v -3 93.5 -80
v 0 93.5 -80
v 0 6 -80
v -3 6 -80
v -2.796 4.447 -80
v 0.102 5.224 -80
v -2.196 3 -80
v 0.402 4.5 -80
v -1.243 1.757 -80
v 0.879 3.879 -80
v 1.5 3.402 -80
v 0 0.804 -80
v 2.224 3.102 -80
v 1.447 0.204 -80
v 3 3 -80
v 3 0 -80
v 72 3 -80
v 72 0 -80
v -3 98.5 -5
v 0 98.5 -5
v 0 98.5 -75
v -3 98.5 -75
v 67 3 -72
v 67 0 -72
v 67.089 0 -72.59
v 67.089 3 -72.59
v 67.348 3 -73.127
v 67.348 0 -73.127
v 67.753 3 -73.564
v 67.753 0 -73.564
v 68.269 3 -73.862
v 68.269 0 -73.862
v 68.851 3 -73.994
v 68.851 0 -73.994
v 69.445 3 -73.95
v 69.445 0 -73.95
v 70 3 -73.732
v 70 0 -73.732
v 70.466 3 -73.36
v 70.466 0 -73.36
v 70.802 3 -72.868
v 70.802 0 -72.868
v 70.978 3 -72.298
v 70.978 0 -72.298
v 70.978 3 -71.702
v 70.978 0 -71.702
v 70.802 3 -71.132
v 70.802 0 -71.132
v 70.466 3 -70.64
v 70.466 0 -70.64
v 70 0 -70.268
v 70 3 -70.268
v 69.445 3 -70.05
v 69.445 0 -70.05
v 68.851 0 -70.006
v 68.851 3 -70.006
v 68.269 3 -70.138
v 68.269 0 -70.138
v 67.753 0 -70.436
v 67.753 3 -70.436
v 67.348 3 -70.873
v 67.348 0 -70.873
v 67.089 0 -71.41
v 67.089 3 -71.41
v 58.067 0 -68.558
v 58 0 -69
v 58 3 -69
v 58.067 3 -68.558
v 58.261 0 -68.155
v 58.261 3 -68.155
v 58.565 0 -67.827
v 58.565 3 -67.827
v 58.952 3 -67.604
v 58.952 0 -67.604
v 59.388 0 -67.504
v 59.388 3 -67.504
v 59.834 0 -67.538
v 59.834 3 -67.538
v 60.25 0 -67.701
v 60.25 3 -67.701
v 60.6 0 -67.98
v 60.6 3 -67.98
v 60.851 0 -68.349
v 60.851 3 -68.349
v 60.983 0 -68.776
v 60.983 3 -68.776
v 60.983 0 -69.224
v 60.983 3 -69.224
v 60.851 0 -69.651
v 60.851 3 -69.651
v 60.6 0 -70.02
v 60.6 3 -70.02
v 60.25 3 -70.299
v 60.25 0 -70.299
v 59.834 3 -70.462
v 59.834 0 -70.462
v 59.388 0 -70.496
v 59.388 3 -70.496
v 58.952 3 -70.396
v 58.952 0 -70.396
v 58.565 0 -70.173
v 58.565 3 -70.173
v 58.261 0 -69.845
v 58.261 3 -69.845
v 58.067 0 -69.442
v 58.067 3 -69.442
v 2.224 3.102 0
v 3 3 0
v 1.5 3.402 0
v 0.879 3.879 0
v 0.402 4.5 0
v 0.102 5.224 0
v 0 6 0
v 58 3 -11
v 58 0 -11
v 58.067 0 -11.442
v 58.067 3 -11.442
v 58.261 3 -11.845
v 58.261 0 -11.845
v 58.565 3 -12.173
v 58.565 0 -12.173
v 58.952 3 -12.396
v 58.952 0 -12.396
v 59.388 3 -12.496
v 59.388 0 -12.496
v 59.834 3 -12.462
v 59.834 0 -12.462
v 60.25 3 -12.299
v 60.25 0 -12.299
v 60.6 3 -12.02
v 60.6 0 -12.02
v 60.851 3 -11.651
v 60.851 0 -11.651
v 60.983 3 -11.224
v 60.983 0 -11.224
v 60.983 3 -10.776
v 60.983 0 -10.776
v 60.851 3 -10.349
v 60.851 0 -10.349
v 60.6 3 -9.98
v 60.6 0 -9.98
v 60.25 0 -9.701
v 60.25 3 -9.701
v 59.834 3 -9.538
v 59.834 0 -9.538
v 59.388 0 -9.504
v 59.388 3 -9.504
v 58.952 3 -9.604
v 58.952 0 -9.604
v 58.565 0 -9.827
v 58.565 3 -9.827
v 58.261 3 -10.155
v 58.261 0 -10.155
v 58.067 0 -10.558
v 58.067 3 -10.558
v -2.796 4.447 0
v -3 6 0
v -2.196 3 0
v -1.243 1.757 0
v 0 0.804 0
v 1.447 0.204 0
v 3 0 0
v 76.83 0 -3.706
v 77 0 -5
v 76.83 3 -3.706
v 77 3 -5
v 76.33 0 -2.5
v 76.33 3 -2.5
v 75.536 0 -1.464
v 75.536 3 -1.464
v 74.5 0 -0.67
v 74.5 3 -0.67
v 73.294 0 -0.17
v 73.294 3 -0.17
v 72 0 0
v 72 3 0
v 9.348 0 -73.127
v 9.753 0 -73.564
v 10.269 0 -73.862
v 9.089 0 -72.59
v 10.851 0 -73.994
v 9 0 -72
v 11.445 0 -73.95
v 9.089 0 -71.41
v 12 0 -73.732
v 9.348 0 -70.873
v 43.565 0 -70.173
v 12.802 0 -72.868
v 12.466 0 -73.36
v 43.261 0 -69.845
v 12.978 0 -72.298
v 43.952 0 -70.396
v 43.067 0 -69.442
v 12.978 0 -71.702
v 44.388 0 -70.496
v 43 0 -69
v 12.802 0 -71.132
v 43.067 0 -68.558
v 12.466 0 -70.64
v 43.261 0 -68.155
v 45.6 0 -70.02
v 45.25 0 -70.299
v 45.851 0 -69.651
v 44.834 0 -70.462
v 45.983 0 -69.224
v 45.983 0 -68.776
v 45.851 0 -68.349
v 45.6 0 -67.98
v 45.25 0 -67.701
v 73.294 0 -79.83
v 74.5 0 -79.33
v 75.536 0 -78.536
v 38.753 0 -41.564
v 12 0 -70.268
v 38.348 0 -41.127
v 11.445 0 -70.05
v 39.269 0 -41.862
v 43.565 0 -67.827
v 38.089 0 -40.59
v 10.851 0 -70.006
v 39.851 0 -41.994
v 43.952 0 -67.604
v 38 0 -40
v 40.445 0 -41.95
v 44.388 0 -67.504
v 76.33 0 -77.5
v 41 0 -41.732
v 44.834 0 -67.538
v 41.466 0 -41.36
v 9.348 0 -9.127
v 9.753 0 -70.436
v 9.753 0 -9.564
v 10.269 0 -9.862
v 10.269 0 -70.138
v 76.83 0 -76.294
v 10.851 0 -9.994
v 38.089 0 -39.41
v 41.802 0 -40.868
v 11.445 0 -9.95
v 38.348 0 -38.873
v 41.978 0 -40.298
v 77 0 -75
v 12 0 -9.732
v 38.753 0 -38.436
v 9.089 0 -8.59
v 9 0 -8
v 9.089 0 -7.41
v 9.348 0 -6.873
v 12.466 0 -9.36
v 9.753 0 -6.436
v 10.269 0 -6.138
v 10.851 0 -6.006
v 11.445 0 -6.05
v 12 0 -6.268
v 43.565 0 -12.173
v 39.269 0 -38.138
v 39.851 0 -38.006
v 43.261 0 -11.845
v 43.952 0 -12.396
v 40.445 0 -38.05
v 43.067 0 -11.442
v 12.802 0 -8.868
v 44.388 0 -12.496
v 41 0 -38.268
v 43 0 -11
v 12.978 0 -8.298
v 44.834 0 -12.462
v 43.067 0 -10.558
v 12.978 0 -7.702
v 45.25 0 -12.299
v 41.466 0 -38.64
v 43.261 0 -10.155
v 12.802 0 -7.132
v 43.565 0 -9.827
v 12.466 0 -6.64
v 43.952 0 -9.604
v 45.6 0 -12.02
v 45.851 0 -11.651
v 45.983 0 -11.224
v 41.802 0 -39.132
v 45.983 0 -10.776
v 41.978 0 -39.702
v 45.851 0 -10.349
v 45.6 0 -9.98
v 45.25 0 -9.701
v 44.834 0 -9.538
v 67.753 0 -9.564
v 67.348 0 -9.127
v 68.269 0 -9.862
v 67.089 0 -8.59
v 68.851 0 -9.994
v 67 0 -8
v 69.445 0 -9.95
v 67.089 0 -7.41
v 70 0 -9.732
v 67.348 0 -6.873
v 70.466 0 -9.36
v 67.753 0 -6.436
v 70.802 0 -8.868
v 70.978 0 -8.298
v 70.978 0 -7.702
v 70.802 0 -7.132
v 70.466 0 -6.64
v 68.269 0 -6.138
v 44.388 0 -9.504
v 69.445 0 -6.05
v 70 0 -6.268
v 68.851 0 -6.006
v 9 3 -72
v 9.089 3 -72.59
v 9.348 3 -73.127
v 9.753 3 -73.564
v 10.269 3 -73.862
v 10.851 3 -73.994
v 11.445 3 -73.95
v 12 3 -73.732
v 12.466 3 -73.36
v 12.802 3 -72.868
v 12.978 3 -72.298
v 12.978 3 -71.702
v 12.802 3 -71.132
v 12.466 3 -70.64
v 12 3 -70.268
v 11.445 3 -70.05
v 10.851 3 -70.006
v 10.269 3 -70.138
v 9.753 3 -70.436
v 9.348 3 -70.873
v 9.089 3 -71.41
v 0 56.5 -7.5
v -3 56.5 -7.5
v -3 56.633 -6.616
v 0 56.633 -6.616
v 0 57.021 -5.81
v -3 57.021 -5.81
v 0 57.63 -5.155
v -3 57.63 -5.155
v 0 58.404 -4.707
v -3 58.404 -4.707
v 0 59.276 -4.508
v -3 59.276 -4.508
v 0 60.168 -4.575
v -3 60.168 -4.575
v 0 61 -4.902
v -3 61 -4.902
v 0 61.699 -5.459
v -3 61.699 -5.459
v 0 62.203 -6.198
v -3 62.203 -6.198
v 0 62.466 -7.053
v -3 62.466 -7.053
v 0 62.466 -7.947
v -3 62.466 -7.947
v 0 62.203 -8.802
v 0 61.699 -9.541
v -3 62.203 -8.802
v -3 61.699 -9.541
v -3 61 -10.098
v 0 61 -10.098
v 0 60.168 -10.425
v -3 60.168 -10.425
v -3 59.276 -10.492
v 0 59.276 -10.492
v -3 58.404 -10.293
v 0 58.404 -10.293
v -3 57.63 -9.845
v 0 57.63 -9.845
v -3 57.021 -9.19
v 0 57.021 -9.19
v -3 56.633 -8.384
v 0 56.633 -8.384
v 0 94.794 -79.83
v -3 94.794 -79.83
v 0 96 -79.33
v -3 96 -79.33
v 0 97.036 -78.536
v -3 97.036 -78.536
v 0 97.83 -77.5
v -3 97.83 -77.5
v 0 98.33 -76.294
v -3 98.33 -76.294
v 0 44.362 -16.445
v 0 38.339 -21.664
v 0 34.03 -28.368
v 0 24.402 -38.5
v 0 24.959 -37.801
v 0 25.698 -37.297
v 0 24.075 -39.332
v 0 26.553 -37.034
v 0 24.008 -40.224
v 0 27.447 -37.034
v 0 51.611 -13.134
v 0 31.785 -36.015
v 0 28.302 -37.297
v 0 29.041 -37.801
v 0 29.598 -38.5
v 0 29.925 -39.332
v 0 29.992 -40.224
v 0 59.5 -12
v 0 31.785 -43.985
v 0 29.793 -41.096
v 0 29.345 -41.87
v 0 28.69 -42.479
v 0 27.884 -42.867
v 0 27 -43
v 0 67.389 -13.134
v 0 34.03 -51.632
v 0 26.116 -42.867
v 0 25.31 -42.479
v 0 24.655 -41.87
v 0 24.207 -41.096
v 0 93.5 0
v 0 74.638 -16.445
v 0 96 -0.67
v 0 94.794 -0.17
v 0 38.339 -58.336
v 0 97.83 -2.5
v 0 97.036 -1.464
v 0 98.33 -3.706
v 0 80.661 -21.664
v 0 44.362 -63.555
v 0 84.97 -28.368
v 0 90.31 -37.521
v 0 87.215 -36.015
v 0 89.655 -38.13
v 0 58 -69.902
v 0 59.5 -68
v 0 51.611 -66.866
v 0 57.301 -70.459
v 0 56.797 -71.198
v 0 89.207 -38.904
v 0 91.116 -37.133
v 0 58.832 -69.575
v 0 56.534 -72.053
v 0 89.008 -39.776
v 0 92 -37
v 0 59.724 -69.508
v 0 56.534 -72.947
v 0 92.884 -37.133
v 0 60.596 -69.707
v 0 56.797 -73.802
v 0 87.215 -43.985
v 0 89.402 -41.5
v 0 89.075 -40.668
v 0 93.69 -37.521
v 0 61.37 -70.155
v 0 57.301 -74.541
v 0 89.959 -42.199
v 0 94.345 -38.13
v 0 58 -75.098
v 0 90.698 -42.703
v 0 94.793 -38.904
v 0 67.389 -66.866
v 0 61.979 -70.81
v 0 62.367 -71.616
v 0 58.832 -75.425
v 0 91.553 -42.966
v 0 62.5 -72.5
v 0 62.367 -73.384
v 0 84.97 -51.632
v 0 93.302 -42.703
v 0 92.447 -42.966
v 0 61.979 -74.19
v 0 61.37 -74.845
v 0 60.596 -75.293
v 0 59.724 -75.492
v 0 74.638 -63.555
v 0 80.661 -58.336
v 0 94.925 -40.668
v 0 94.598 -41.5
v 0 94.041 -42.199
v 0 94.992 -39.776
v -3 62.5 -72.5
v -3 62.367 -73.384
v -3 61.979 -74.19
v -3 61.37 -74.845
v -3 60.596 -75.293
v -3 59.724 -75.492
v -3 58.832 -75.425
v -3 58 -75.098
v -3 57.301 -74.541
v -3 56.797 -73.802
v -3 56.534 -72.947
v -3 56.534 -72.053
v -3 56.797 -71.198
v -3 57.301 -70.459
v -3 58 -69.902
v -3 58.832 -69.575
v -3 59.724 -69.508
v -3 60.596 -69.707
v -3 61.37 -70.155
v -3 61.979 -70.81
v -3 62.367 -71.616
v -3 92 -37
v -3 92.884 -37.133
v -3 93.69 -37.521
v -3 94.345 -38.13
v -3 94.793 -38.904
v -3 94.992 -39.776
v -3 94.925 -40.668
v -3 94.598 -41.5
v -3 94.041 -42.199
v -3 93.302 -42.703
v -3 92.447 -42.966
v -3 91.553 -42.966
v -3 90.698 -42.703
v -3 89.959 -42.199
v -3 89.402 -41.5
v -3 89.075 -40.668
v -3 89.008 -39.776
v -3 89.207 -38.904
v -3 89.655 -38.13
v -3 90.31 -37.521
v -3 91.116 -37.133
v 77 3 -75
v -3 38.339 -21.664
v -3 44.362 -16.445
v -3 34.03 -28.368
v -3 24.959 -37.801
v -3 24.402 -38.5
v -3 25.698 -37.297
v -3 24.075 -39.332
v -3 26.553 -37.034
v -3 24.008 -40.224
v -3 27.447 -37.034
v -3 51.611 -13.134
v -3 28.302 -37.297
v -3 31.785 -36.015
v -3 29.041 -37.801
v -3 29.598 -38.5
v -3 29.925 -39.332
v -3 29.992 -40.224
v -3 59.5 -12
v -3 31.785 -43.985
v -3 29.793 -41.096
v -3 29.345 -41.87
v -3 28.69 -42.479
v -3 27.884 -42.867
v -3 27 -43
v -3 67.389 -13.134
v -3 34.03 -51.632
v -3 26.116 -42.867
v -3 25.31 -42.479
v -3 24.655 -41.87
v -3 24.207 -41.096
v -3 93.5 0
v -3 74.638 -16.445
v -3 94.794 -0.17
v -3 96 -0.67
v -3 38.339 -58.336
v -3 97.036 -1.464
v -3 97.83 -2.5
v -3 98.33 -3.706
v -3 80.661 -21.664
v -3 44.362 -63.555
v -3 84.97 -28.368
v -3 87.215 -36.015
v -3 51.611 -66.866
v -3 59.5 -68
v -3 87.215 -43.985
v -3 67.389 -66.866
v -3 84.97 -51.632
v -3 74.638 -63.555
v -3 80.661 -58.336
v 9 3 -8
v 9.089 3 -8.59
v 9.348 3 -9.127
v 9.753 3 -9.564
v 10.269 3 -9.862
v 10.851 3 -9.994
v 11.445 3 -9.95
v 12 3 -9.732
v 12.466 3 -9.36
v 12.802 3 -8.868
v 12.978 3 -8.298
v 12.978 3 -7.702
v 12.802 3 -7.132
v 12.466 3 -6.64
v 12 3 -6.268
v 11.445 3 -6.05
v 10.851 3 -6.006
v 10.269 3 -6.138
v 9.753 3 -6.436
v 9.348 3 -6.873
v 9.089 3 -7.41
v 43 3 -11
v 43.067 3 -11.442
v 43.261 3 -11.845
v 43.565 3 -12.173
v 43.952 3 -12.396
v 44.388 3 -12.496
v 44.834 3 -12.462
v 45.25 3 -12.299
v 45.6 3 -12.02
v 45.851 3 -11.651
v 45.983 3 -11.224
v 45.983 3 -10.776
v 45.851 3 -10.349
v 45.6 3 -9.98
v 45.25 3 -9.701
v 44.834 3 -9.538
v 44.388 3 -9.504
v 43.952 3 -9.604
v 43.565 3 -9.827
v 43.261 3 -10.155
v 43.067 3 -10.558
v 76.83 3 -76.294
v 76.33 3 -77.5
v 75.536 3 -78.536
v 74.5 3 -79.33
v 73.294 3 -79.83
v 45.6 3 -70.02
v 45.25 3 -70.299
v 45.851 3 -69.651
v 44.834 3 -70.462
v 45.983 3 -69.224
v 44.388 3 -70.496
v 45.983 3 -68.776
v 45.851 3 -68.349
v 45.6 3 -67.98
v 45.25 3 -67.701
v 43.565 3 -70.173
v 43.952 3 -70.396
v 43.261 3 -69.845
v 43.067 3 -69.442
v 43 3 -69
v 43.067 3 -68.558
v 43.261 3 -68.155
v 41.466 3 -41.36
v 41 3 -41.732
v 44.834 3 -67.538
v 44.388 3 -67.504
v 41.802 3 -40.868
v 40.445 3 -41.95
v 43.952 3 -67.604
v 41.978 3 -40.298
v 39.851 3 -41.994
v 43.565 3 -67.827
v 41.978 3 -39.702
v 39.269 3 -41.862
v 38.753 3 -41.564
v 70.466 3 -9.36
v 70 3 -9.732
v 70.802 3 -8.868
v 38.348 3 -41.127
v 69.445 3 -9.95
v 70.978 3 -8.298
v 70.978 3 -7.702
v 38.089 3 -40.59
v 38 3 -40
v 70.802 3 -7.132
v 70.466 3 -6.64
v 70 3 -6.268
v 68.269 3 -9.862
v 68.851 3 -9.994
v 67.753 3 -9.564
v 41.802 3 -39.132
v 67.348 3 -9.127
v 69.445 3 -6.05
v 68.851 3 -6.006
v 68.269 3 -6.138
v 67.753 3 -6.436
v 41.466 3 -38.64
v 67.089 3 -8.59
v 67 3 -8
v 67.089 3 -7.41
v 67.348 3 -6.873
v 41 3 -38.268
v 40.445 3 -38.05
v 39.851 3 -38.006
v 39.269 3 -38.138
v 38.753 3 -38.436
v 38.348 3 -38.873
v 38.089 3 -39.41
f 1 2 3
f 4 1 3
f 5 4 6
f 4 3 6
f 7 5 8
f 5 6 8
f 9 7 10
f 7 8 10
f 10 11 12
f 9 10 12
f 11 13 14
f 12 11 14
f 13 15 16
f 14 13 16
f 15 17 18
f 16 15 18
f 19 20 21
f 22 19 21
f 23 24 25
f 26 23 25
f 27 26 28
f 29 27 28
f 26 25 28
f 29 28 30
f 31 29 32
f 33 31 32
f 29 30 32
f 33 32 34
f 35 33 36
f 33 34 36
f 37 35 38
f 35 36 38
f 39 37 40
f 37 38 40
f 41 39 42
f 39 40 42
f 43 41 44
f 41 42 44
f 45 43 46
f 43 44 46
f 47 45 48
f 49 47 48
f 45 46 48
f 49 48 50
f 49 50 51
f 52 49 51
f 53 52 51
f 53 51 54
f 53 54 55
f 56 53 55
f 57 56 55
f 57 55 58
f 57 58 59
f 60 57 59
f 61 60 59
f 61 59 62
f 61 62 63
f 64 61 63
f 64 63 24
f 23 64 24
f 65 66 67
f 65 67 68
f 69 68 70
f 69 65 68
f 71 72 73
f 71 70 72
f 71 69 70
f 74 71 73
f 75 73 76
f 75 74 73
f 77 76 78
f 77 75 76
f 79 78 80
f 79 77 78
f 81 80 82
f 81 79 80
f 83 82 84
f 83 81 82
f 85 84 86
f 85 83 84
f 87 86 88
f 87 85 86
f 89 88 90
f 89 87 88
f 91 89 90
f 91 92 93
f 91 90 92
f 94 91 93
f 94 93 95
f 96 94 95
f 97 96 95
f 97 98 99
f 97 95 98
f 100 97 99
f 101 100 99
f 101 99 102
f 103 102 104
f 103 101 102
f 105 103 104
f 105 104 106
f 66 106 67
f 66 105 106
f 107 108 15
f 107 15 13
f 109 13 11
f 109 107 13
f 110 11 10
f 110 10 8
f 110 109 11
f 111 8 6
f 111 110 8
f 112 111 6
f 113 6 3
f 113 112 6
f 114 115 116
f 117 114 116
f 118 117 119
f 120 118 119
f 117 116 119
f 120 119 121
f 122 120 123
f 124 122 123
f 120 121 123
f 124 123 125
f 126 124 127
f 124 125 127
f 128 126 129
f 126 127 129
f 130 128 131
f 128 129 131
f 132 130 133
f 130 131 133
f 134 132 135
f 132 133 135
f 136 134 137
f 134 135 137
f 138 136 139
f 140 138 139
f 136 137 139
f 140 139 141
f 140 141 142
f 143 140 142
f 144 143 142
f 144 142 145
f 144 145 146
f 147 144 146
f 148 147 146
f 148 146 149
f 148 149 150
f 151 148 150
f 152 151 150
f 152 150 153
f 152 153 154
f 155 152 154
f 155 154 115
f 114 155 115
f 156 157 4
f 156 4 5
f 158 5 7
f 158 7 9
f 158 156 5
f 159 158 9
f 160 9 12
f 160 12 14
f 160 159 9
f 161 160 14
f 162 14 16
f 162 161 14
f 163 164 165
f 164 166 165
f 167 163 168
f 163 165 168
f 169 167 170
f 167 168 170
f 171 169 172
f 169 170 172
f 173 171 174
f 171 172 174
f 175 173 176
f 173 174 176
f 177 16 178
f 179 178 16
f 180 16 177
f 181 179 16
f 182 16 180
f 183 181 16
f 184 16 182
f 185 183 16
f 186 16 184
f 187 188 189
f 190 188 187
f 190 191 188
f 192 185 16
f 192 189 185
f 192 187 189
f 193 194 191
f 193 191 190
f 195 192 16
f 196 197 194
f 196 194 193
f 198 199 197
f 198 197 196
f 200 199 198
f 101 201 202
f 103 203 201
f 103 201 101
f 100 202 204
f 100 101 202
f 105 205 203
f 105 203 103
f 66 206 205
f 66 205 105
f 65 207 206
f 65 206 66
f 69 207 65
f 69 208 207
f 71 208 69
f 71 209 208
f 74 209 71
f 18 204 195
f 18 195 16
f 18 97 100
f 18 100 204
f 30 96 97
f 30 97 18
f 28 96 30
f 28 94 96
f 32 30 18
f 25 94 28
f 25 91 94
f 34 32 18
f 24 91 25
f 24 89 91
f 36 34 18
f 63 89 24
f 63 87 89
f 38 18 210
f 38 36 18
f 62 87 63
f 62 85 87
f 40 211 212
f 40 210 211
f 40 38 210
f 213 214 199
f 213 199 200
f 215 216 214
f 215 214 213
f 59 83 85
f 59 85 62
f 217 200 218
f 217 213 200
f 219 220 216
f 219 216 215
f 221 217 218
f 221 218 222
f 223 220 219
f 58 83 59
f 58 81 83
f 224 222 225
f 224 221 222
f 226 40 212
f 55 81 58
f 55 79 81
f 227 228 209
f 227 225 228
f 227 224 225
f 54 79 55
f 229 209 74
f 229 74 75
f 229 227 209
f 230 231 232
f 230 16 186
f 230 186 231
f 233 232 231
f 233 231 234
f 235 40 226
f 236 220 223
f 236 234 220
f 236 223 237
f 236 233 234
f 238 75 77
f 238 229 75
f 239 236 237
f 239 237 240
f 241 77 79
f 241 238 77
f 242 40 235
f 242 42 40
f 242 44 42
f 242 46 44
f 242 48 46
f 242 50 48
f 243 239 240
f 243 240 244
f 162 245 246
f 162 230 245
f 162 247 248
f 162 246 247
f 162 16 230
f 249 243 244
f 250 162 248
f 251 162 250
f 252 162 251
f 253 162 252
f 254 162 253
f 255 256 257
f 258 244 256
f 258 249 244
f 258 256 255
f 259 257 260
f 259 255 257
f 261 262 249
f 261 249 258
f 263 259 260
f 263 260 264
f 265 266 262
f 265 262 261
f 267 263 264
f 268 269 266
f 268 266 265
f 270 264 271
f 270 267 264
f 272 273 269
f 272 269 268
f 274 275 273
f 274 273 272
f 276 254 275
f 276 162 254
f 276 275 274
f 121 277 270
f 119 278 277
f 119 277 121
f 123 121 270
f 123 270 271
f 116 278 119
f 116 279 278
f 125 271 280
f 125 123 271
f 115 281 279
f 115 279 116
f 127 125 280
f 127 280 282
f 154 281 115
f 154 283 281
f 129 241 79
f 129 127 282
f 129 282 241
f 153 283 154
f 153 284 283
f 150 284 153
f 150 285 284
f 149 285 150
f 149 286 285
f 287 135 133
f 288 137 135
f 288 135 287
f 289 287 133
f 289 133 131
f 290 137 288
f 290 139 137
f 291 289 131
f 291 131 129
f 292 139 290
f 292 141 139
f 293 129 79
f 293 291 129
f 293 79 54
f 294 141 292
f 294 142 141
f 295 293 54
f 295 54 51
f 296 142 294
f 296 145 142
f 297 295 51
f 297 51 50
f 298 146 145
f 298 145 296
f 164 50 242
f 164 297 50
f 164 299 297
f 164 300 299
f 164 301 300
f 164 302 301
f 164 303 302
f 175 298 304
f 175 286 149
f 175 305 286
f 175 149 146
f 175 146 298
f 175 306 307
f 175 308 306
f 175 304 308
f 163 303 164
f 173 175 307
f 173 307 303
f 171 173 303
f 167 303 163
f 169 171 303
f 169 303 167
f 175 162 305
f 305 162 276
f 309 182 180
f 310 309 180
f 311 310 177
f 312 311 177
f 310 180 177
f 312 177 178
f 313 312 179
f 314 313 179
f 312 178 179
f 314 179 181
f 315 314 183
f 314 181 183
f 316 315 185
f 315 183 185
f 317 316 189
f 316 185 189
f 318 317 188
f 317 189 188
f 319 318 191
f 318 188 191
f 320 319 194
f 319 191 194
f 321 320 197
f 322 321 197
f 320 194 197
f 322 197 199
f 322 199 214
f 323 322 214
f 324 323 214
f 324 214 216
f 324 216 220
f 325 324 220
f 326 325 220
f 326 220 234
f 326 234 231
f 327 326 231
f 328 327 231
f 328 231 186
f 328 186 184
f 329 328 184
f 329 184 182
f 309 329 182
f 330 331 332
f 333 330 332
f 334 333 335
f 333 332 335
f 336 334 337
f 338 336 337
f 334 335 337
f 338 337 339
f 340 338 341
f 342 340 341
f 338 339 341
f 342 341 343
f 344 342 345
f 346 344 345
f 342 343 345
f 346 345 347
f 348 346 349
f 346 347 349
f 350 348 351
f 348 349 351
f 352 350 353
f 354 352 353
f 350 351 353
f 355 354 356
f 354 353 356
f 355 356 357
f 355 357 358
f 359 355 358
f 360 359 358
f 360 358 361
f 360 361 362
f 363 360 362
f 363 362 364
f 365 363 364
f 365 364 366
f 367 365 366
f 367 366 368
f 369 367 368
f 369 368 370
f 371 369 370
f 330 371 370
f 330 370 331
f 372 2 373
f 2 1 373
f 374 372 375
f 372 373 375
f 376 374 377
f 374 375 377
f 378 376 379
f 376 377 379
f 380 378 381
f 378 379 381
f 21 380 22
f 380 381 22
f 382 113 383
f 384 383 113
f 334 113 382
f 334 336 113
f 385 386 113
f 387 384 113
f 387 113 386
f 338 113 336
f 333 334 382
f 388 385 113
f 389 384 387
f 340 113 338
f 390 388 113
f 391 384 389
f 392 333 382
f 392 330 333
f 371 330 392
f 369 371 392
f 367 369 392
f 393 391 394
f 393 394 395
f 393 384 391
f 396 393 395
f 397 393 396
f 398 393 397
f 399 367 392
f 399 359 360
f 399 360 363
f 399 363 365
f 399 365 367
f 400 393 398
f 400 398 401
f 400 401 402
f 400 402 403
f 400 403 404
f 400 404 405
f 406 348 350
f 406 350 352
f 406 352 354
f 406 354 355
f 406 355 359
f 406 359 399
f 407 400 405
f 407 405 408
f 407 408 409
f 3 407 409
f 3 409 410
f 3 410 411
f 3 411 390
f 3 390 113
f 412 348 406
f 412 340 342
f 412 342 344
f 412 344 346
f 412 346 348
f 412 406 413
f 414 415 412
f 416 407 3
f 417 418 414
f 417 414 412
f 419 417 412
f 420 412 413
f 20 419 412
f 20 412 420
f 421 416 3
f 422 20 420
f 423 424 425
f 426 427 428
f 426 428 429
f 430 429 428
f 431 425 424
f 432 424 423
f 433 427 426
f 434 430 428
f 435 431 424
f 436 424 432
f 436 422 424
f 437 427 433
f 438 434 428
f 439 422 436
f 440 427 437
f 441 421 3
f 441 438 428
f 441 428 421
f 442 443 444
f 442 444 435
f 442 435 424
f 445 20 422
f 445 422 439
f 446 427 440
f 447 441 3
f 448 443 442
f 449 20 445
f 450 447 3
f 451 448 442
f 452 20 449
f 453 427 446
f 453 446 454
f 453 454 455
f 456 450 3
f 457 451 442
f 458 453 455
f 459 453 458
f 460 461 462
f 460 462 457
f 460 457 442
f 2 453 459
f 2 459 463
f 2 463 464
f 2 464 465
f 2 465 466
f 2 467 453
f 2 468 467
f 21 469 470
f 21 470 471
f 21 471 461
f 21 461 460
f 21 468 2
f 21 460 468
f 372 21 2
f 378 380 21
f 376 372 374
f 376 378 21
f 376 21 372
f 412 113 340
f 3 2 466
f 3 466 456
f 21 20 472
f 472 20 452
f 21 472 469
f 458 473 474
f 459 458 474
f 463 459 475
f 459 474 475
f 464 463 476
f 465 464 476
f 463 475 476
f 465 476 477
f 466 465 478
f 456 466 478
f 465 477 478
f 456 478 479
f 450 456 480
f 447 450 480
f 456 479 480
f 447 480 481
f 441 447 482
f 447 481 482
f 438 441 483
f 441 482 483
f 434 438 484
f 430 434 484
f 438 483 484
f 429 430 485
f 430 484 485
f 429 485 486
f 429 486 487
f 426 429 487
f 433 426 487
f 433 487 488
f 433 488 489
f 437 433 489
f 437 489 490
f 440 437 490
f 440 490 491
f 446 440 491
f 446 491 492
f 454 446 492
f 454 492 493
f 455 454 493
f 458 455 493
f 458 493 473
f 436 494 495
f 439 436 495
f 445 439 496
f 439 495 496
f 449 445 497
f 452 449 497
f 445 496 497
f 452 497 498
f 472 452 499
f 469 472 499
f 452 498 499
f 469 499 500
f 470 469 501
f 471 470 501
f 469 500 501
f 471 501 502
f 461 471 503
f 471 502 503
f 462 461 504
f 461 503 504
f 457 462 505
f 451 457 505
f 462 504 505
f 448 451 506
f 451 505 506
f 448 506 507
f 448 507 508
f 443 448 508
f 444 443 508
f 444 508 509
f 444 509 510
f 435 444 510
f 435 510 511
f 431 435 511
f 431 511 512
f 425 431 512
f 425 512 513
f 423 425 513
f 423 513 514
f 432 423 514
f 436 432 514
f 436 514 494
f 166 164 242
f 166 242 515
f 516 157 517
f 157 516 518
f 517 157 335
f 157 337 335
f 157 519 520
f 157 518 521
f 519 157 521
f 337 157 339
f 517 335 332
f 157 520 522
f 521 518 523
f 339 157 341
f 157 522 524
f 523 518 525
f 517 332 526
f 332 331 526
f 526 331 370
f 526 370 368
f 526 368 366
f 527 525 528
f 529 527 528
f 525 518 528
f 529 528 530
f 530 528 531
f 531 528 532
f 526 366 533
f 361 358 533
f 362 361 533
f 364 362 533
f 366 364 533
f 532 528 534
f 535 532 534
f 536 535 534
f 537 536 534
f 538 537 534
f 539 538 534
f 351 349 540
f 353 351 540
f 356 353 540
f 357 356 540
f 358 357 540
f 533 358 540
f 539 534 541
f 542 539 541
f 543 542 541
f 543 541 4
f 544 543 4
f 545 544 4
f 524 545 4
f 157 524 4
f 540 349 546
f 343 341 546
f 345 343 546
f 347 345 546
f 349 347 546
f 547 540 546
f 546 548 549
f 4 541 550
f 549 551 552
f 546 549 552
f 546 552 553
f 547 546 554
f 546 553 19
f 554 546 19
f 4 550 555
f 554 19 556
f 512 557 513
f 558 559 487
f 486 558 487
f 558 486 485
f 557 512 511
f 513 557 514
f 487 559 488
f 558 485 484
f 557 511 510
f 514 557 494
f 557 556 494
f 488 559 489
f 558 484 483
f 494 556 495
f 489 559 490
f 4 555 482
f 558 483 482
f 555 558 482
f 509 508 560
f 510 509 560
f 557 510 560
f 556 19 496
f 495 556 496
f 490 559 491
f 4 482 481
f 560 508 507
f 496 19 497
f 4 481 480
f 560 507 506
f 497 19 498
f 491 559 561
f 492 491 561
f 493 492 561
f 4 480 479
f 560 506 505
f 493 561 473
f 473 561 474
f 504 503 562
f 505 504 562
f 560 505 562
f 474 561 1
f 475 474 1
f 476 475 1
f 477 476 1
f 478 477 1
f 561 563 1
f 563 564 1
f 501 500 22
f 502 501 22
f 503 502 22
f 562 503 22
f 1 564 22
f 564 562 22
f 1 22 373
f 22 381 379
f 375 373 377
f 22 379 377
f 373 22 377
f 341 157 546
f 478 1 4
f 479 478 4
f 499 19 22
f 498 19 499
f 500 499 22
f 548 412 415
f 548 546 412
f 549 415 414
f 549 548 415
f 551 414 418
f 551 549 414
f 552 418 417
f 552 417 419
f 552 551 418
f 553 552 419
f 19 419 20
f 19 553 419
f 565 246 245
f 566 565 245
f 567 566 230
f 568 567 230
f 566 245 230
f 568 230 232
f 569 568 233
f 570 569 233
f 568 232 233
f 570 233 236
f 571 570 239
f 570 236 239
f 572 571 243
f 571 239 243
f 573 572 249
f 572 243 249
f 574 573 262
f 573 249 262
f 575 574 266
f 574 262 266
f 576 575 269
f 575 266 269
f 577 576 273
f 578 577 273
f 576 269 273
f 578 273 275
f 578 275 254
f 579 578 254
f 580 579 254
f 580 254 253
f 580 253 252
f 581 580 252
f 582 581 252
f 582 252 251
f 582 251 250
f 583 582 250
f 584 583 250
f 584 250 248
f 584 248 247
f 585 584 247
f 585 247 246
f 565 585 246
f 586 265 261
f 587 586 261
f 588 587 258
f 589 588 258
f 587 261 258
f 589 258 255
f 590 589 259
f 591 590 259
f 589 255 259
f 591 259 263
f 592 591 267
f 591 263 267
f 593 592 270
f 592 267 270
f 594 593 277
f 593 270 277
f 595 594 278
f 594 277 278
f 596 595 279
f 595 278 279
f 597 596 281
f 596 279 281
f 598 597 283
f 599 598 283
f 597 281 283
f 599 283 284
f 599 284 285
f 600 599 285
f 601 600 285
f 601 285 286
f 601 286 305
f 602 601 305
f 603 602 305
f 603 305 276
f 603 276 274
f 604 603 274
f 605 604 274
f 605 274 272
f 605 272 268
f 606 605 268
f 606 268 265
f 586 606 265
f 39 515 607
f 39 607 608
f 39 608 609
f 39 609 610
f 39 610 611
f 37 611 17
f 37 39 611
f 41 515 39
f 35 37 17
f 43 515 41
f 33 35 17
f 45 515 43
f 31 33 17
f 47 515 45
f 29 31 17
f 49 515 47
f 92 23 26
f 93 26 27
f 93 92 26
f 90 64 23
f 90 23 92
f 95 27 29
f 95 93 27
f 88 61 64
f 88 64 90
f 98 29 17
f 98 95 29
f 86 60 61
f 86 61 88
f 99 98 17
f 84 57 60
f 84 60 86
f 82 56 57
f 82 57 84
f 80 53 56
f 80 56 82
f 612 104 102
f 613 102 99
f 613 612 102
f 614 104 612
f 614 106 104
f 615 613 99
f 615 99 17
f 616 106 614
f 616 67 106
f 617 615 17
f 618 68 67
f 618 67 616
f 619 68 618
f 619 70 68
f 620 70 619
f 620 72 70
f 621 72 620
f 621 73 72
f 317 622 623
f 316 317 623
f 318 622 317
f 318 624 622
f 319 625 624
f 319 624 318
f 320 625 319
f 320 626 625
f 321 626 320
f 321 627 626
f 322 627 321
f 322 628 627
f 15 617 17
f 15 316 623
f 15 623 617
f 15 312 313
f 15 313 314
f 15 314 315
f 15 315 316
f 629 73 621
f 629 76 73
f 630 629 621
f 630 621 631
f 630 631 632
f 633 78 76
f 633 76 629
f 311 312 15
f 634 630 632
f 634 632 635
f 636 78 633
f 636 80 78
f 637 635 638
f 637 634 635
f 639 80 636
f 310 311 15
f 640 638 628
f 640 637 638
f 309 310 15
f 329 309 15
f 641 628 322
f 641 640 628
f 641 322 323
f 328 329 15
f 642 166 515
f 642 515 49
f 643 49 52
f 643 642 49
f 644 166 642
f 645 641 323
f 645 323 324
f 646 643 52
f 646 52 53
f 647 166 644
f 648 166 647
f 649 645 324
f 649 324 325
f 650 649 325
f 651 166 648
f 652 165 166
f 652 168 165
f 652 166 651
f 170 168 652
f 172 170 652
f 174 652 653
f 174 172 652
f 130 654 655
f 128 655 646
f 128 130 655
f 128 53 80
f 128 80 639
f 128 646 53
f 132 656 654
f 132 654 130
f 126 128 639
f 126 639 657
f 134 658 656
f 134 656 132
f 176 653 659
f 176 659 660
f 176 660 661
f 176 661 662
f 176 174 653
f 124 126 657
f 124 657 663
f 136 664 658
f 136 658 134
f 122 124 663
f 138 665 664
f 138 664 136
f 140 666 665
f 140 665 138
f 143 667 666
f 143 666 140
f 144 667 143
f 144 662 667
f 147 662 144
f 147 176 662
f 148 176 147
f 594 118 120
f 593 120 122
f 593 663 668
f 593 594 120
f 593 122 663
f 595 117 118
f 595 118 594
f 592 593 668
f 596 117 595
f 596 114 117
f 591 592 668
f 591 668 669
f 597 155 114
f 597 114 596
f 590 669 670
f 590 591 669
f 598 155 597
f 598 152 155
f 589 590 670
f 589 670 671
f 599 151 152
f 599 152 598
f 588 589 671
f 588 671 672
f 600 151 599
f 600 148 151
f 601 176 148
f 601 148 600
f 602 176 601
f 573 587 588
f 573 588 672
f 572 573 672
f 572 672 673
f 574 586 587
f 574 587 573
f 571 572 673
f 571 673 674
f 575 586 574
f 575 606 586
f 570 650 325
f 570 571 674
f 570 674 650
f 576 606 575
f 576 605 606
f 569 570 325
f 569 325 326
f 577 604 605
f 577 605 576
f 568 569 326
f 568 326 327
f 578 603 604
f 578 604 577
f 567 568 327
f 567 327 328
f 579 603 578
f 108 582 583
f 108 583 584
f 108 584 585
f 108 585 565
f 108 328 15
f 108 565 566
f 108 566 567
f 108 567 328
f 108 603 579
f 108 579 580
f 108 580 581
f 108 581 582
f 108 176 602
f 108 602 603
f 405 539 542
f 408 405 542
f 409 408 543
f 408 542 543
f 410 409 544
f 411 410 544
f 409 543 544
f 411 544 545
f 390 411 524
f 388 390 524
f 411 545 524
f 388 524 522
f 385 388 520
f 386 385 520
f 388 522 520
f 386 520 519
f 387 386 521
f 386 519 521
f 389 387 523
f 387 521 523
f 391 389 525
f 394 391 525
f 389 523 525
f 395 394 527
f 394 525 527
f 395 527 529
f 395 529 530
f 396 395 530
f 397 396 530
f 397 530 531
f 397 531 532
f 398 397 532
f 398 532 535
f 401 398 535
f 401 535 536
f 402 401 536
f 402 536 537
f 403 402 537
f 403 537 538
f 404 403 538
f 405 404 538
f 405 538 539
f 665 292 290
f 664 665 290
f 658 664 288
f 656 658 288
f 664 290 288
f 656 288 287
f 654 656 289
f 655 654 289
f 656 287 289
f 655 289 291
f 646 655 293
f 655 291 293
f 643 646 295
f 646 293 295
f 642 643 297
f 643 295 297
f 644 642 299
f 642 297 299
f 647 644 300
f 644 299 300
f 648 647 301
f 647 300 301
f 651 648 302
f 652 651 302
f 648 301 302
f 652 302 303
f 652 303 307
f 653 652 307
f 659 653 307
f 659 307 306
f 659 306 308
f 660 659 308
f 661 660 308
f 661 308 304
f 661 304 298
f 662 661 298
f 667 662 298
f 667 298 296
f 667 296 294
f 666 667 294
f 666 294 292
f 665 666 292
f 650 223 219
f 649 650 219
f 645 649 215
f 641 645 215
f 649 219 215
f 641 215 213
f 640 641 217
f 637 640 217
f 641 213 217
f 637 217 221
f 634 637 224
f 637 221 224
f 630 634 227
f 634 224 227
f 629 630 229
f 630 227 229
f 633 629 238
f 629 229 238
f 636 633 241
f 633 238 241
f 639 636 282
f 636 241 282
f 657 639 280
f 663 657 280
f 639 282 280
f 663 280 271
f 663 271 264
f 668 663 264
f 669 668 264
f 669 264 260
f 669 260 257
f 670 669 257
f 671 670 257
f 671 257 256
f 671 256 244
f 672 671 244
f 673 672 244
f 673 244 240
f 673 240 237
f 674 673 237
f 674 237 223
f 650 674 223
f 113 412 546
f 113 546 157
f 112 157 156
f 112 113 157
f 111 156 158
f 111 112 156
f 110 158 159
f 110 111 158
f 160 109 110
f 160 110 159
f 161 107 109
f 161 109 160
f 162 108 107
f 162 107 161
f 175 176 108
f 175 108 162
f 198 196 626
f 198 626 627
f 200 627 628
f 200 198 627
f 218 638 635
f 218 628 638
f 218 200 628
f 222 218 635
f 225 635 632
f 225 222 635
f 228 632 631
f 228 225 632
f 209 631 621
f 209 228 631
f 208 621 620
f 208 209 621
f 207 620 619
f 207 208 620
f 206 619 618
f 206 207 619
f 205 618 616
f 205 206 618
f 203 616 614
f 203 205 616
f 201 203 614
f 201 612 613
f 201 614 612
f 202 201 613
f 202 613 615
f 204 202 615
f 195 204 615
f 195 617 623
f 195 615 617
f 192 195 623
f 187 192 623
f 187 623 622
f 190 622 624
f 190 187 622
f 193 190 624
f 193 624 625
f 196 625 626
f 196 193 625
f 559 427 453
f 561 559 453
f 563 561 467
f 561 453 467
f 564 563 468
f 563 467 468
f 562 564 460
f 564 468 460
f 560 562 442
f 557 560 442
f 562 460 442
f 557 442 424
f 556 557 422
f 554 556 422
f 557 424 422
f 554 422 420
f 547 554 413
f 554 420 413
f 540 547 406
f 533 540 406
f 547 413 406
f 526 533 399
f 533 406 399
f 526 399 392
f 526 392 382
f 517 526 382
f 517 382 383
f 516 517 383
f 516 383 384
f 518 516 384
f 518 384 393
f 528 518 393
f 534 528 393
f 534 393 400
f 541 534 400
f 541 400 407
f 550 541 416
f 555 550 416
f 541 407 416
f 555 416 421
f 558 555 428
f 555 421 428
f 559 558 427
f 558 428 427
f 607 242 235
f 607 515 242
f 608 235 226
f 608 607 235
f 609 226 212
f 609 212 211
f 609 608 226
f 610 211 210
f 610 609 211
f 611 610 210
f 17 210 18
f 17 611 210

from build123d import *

# Parameters (mm, degrees)
SKETCH1_W                        = 80
SKETCH1_H                        = 98.5
SKETCH1_R                        = 28
BASE_FLANGE1_DEPTH               = 3
F_6_0_6_DIAMETER_HOLE1_D         = 6
CIRPATTERN1_COUNT                = 4
SM_EDGE_FLANGE_1_STRIP_W         = 18
SM_EDGE_FLANGE_1_STRIP_H         = 3
SM_EDGE_FLANGE_1_STRIP_CUT_DEPTH = 80
SM_EDGE_FLANGE_1_DEPTH           = 80
FILLET1_R                        = 5
F_4_0_4_DIAMETER_HOLE4_D         = 4
F_3_0_3_DIAMETER_HOLE2_D         = 3


# Sheet-metal steps are written as plain solids
with BuildPart() as part:
    # Sketch1 → Base-Flange1 (new body)
    with BuildSketch(Plane(origin=(0, 0, 0), x_dir=(0, 0, -1), z_dir=(1, 0, 0))):
        with Locations((40, 49.25)):
            Rectangle(SKETCH1_W, SKETCH1_H)
        with Locations((40, 59.5)):
            Circle(SKETCH1_R, mode=Mode.SUBTRACT)
    extrude(amount=-BASE_FLANGE1_DEPTH)

    # Ø6.0 (6) Diameter Hole1 (through all)
    with Locations(Plane(origin=(0, 0, 0), x_dir=(0, 0, -1), z_dir=(1, 0, 0))):
        with Locations((40, 92)):
            f_6_0_6_diameter_hole1 = Hole(F_6_0_6_DIAMETER_HOLE1_D / 2)

    # CirPattern1: Ø6.0 (6) Diameter Hole1 ×4 about axis
    cirpattern1_axis = Axis((0, 59.5, -40), (1, 0, 0))
    for i in range(1, CIRPATTERN1_COUNT):
        add(f_6_0_6_diameter_hole1.rotate(cirpattern1_axis, i * 360 / CIRPATTERN1_COUNT), mode=Mode.SUBTRACT)

    # 邊線-凸緣1 strip (across the edge) → 邊線-凸緣1 strip cut (cut)
    with BuildSketch(Plane.YX):
        with Locations((-3, -1.5)):
            Rectangle(SM_EDGE_FLANGE_1_STRIP_W, SM_EDGE_FLANGE_1_STRIP_H)
    extrude(amount=SM_EDGE_FLANGE_1_STRIP_CUT_DEPTH, mode=Mode.SUBTRACT)

    # 邊線-凸緣1 section (across the edge) → 邊線-凸緣1 (add)
    with BuildSketch(Plane.YX):
        with BuildLine():
            Line((0, 3), (0, 77))
            Line((0, 77), (3, 77))
            Line((3, 77), (3, 3))
            ThreePointArc((3, 3), (3.878679656, 0.878679656), (6, 0))
            Line((6, 0), (6, -3))
            ThreePointArc((6, -3), (1.757359313, -1.242640687), (0, 3))
        make_face()
    extrude(amount=SM_EDGE_FLANGE_1_DEPTH)

    # Fillet1
    fillet1_edges = [part.edges().sort_by_distance(p)[0] for p in [
        (77, 1.5, 0),
        (77, 1.5, -80),
        (-1.5, 98.5, 0),
        (-1.5, 98.5, -80),
    ]]
    fillet(fillet1_edges, radius=FILLET1_R)

    # Ø4.0 (4) Diameter Hole4 (through all)
    with Locations(Plane(origin=(0, 3, 0), x_dir=(1, 0, 0), z_dir=(0, 1, 0))):
        with Locations((11, 8), (11, 72), (69, 72), (69, 8), (40, 40)):
            Hole(F_4_0_4_DIAMETER_HOLE4_D / 2)

    # Ø3.0 (3) Diameter Hole2 (through all)
    with Locations(Plane(origin=(0, 3, 0), x_dir=(1, 0, 0), z_dir=(0, 1, 0))):
        with Locations((44.5, 11), (59.5, 11)):
            f_3_0_3_diameter_hole2 = Hole(F_3_0_3_DIAMETER_HOLE2_D / 2)

    # Mirror1: Ø3.0 (3) Diameter Hole2 across plane
    add(f_3_0_3_diameter_hole2.mirror(Plane.XY.offset(-40)), mode=Mode.SUBTRACT)


solid = part.part
